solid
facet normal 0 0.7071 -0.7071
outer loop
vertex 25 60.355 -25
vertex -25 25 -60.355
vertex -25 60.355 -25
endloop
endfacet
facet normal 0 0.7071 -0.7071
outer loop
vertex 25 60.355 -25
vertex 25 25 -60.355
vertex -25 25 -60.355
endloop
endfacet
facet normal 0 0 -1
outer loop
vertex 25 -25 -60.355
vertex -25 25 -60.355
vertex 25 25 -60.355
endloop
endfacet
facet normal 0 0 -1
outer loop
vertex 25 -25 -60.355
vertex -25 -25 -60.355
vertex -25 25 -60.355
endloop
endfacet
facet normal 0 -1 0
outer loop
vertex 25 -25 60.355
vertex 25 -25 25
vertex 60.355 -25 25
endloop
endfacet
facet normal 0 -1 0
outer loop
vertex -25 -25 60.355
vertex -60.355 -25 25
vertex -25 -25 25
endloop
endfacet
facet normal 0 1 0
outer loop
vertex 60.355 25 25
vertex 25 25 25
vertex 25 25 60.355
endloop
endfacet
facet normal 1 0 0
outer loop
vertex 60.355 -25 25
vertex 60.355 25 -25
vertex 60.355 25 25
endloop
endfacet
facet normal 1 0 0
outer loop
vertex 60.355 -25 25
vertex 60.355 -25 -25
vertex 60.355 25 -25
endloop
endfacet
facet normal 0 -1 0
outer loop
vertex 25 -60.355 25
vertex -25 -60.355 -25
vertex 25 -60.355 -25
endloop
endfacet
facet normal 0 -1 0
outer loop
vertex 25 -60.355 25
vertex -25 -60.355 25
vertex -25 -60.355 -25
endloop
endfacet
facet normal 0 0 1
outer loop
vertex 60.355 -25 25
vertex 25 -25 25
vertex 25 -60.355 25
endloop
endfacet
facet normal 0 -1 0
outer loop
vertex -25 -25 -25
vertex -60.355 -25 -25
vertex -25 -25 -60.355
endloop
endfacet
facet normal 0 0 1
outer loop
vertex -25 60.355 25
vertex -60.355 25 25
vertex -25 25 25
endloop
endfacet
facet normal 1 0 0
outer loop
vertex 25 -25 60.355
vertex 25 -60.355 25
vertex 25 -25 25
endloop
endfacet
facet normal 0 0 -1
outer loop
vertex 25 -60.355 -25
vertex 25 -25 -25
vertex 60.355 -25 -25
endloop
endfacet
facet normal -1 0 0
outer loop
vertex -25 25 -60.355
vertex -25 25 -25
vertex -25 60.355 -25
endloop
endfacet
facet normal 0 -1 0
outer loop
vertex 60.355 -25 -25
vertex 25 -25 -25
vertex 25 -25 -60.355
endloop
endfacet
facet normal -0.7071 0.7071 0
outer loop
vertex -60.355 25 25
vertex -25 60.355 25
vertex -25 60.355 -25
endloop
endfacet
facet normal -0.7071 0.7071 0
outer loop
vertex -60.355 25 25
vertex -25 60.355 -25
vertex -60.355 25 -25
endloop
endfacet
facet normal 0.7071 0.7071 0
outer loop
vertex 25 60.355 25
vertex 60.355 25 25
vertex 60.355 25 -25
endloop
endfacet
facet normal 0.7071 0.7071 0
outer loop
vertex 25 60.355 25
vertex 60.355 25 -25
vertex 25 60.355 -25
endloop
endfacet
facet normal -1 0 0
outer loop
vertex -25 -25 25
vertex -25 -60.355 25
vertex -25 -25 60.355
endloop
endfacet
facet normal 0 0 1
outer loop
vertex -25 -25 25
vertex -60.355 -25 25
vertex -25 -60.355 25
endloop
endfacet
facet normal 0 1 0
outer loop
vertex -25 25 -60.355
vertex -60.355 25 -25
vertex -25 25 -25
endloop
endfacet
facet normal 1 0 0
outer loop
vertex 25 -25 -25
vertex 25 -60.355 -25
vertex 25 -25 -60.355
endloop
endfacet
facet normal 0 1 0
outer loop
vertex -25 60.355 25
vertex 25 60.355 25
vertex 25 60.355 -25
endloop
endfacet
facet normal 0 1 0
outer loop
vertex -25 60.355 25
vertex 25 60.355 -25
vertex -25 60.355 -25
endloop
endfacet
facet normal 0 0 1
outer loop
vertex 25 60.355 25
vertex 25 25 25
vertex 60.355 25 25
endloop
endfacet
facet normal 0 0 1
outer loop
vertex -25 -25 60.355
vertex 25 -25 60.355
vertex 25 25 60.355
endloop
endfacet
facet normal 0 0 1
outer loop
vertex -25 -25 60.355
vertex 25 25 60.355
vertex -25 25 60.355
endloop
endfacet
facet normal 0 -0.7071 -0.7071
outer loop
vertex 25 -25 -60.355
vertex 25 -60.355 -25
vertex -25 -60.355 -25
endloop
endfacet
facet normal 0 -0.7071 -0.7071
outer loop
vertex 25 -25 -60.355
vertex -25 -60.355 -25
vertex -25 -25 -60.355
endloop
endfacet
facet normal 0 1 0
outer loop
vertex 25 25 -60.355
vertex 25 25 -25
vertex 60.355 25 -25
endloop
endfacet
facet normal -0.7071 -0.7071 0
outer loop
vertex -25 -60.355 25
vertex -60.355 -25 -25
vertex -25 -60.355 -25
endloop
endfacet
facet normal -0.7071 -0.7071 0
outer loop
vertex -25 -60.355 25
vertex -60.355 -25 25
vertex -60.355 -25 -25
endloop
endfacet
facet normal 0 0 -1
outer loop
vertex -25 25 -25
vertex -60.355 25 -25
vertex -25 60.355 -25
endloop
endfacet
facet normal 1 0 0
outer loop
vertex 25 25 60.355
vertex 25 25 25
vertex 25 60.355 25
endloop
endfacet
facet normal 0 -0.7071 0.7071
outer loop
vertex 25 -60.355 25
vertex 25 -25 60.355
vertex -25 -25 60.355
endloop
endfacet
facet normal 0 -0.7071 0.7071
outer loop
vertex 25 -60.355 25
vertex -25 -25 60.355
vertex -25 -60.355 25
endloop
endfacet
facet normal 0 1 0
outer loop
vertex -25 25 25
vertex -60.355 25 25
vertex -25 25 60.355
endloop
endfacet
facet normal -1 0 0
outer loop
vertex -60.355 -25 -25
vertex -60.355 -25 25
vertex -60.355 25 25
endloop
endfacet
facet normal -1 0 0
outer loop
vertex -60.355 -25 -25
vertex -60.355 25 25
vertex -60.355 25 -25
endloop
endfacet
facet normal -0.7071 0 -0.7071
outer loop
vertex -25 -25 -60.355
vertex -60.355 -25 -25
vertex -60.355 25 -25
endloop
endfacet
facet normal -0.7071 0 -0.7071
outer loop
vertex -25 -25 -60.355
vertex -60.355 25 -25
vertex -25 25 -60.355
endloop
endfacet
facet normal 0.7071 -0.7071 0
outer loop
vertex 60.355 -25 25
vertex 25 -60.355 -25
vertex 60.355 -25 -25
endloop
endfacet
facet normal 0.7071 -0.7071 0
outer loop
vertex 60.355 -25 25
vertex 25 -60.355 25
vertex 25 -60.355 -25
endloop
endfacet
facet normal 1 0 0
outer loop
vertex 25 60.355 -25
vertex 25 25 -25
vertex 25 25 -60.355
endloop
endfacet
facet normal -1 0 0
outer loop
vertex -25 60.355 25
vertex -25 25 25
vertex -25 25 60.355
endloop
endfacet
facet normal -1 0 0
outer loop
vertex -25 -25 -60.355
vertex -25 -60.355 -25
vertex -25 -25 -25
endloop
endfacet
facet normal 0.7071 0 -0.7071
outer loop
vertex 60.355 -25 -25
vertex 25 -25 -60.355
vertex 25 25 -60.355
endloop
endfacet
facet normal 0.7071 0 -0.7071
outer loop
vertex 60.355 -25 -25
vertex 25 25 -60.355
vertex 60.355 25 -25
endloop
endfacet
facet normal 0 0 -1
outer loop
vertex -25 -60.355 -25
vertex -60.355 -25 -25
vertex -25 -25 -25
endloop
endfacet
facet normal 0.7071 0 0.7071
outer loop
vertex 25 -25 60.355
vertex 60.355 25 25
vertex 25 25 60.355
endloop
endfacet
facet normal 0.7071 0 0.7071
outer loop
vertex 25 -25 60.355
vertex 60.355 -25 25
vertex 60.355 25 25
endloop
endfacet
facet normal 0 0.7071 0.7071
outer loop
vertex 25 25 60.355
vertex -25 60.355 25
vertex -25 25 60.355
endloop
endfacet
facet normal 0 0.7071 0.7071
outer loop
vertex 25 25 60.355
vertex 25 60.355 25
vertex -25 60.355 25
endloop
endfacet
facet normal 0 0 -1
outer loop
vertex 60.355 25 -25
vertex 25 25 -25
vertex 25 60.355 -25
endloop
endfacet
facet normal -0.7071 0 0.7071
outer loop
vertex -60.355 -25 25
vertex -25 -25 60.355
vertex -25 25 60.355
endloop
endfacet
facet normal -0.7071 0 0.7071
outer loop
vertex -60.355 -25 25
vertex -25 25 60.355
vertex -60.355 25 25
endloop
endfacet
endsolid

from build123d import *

# Parameters (mm, degrees)
F2_DEPTH      = 25
F2_DEPTH_BACK = 25
F4_DEPTH      = 25
F4_DEPTH_BACK = 25
F6_DEPTH      = 25
F6_DEPTH_BACK = 25


with BuildPart() as f2:
    # F1 (on Front) → F2 (new body, two sides)
    with BuildSketch(Plane.XZ) as f2_sk:
        Polygon((25, 60.3553390593), (-25, 60.3553390593), (-60.3553390593, 25), (-60.3553390593, -25), (-25, -60.3553390593), (25, -60.3553390593), (60.3553390593, -25), (60.3553390593, 25), align=None)
    extrude(amount=F2_DEPTH)
    extrude(f2_sk.sketch, amount=-F2_DEPTH_BACK)

    # F3 (on Top) → F4 (join, two sides)
    with BuildSketch(Plane.XY) as f4_sk:
        Polygon((25, -60.3553390593), (60.3553390593, -25), (60.3553390593, 25), (25, 60.3553390593), (-25, 60.3553390593), (-60.3553390593, 25), (-60.3553390593, -25), (-25, -60.3553390593), align=None)
    extrude(amount=F4_DEPTH)
    extrude(f4_sk.sketch, amount=-F4_DEPTH_BACK)

    # F5 (on Right) → F6 (join, two sides)
    with BuildSketch(Plane.YZ) as f6_sk:
        Polygon((60.3553390593, 25), (25, 60.3553390593), (-25, 60.3553390593), (-60.3553390593, 25), (-60.3553390593, -25), (-25, -60.3553390593), (25, -60.3553390593), (60.3553390593, -25), align=None)
    extrude(amount=F6_DEPTH)
    extrude(f6_sk.sketch, amount=-F6_DEPTH_BACK)


solid = f2.part
